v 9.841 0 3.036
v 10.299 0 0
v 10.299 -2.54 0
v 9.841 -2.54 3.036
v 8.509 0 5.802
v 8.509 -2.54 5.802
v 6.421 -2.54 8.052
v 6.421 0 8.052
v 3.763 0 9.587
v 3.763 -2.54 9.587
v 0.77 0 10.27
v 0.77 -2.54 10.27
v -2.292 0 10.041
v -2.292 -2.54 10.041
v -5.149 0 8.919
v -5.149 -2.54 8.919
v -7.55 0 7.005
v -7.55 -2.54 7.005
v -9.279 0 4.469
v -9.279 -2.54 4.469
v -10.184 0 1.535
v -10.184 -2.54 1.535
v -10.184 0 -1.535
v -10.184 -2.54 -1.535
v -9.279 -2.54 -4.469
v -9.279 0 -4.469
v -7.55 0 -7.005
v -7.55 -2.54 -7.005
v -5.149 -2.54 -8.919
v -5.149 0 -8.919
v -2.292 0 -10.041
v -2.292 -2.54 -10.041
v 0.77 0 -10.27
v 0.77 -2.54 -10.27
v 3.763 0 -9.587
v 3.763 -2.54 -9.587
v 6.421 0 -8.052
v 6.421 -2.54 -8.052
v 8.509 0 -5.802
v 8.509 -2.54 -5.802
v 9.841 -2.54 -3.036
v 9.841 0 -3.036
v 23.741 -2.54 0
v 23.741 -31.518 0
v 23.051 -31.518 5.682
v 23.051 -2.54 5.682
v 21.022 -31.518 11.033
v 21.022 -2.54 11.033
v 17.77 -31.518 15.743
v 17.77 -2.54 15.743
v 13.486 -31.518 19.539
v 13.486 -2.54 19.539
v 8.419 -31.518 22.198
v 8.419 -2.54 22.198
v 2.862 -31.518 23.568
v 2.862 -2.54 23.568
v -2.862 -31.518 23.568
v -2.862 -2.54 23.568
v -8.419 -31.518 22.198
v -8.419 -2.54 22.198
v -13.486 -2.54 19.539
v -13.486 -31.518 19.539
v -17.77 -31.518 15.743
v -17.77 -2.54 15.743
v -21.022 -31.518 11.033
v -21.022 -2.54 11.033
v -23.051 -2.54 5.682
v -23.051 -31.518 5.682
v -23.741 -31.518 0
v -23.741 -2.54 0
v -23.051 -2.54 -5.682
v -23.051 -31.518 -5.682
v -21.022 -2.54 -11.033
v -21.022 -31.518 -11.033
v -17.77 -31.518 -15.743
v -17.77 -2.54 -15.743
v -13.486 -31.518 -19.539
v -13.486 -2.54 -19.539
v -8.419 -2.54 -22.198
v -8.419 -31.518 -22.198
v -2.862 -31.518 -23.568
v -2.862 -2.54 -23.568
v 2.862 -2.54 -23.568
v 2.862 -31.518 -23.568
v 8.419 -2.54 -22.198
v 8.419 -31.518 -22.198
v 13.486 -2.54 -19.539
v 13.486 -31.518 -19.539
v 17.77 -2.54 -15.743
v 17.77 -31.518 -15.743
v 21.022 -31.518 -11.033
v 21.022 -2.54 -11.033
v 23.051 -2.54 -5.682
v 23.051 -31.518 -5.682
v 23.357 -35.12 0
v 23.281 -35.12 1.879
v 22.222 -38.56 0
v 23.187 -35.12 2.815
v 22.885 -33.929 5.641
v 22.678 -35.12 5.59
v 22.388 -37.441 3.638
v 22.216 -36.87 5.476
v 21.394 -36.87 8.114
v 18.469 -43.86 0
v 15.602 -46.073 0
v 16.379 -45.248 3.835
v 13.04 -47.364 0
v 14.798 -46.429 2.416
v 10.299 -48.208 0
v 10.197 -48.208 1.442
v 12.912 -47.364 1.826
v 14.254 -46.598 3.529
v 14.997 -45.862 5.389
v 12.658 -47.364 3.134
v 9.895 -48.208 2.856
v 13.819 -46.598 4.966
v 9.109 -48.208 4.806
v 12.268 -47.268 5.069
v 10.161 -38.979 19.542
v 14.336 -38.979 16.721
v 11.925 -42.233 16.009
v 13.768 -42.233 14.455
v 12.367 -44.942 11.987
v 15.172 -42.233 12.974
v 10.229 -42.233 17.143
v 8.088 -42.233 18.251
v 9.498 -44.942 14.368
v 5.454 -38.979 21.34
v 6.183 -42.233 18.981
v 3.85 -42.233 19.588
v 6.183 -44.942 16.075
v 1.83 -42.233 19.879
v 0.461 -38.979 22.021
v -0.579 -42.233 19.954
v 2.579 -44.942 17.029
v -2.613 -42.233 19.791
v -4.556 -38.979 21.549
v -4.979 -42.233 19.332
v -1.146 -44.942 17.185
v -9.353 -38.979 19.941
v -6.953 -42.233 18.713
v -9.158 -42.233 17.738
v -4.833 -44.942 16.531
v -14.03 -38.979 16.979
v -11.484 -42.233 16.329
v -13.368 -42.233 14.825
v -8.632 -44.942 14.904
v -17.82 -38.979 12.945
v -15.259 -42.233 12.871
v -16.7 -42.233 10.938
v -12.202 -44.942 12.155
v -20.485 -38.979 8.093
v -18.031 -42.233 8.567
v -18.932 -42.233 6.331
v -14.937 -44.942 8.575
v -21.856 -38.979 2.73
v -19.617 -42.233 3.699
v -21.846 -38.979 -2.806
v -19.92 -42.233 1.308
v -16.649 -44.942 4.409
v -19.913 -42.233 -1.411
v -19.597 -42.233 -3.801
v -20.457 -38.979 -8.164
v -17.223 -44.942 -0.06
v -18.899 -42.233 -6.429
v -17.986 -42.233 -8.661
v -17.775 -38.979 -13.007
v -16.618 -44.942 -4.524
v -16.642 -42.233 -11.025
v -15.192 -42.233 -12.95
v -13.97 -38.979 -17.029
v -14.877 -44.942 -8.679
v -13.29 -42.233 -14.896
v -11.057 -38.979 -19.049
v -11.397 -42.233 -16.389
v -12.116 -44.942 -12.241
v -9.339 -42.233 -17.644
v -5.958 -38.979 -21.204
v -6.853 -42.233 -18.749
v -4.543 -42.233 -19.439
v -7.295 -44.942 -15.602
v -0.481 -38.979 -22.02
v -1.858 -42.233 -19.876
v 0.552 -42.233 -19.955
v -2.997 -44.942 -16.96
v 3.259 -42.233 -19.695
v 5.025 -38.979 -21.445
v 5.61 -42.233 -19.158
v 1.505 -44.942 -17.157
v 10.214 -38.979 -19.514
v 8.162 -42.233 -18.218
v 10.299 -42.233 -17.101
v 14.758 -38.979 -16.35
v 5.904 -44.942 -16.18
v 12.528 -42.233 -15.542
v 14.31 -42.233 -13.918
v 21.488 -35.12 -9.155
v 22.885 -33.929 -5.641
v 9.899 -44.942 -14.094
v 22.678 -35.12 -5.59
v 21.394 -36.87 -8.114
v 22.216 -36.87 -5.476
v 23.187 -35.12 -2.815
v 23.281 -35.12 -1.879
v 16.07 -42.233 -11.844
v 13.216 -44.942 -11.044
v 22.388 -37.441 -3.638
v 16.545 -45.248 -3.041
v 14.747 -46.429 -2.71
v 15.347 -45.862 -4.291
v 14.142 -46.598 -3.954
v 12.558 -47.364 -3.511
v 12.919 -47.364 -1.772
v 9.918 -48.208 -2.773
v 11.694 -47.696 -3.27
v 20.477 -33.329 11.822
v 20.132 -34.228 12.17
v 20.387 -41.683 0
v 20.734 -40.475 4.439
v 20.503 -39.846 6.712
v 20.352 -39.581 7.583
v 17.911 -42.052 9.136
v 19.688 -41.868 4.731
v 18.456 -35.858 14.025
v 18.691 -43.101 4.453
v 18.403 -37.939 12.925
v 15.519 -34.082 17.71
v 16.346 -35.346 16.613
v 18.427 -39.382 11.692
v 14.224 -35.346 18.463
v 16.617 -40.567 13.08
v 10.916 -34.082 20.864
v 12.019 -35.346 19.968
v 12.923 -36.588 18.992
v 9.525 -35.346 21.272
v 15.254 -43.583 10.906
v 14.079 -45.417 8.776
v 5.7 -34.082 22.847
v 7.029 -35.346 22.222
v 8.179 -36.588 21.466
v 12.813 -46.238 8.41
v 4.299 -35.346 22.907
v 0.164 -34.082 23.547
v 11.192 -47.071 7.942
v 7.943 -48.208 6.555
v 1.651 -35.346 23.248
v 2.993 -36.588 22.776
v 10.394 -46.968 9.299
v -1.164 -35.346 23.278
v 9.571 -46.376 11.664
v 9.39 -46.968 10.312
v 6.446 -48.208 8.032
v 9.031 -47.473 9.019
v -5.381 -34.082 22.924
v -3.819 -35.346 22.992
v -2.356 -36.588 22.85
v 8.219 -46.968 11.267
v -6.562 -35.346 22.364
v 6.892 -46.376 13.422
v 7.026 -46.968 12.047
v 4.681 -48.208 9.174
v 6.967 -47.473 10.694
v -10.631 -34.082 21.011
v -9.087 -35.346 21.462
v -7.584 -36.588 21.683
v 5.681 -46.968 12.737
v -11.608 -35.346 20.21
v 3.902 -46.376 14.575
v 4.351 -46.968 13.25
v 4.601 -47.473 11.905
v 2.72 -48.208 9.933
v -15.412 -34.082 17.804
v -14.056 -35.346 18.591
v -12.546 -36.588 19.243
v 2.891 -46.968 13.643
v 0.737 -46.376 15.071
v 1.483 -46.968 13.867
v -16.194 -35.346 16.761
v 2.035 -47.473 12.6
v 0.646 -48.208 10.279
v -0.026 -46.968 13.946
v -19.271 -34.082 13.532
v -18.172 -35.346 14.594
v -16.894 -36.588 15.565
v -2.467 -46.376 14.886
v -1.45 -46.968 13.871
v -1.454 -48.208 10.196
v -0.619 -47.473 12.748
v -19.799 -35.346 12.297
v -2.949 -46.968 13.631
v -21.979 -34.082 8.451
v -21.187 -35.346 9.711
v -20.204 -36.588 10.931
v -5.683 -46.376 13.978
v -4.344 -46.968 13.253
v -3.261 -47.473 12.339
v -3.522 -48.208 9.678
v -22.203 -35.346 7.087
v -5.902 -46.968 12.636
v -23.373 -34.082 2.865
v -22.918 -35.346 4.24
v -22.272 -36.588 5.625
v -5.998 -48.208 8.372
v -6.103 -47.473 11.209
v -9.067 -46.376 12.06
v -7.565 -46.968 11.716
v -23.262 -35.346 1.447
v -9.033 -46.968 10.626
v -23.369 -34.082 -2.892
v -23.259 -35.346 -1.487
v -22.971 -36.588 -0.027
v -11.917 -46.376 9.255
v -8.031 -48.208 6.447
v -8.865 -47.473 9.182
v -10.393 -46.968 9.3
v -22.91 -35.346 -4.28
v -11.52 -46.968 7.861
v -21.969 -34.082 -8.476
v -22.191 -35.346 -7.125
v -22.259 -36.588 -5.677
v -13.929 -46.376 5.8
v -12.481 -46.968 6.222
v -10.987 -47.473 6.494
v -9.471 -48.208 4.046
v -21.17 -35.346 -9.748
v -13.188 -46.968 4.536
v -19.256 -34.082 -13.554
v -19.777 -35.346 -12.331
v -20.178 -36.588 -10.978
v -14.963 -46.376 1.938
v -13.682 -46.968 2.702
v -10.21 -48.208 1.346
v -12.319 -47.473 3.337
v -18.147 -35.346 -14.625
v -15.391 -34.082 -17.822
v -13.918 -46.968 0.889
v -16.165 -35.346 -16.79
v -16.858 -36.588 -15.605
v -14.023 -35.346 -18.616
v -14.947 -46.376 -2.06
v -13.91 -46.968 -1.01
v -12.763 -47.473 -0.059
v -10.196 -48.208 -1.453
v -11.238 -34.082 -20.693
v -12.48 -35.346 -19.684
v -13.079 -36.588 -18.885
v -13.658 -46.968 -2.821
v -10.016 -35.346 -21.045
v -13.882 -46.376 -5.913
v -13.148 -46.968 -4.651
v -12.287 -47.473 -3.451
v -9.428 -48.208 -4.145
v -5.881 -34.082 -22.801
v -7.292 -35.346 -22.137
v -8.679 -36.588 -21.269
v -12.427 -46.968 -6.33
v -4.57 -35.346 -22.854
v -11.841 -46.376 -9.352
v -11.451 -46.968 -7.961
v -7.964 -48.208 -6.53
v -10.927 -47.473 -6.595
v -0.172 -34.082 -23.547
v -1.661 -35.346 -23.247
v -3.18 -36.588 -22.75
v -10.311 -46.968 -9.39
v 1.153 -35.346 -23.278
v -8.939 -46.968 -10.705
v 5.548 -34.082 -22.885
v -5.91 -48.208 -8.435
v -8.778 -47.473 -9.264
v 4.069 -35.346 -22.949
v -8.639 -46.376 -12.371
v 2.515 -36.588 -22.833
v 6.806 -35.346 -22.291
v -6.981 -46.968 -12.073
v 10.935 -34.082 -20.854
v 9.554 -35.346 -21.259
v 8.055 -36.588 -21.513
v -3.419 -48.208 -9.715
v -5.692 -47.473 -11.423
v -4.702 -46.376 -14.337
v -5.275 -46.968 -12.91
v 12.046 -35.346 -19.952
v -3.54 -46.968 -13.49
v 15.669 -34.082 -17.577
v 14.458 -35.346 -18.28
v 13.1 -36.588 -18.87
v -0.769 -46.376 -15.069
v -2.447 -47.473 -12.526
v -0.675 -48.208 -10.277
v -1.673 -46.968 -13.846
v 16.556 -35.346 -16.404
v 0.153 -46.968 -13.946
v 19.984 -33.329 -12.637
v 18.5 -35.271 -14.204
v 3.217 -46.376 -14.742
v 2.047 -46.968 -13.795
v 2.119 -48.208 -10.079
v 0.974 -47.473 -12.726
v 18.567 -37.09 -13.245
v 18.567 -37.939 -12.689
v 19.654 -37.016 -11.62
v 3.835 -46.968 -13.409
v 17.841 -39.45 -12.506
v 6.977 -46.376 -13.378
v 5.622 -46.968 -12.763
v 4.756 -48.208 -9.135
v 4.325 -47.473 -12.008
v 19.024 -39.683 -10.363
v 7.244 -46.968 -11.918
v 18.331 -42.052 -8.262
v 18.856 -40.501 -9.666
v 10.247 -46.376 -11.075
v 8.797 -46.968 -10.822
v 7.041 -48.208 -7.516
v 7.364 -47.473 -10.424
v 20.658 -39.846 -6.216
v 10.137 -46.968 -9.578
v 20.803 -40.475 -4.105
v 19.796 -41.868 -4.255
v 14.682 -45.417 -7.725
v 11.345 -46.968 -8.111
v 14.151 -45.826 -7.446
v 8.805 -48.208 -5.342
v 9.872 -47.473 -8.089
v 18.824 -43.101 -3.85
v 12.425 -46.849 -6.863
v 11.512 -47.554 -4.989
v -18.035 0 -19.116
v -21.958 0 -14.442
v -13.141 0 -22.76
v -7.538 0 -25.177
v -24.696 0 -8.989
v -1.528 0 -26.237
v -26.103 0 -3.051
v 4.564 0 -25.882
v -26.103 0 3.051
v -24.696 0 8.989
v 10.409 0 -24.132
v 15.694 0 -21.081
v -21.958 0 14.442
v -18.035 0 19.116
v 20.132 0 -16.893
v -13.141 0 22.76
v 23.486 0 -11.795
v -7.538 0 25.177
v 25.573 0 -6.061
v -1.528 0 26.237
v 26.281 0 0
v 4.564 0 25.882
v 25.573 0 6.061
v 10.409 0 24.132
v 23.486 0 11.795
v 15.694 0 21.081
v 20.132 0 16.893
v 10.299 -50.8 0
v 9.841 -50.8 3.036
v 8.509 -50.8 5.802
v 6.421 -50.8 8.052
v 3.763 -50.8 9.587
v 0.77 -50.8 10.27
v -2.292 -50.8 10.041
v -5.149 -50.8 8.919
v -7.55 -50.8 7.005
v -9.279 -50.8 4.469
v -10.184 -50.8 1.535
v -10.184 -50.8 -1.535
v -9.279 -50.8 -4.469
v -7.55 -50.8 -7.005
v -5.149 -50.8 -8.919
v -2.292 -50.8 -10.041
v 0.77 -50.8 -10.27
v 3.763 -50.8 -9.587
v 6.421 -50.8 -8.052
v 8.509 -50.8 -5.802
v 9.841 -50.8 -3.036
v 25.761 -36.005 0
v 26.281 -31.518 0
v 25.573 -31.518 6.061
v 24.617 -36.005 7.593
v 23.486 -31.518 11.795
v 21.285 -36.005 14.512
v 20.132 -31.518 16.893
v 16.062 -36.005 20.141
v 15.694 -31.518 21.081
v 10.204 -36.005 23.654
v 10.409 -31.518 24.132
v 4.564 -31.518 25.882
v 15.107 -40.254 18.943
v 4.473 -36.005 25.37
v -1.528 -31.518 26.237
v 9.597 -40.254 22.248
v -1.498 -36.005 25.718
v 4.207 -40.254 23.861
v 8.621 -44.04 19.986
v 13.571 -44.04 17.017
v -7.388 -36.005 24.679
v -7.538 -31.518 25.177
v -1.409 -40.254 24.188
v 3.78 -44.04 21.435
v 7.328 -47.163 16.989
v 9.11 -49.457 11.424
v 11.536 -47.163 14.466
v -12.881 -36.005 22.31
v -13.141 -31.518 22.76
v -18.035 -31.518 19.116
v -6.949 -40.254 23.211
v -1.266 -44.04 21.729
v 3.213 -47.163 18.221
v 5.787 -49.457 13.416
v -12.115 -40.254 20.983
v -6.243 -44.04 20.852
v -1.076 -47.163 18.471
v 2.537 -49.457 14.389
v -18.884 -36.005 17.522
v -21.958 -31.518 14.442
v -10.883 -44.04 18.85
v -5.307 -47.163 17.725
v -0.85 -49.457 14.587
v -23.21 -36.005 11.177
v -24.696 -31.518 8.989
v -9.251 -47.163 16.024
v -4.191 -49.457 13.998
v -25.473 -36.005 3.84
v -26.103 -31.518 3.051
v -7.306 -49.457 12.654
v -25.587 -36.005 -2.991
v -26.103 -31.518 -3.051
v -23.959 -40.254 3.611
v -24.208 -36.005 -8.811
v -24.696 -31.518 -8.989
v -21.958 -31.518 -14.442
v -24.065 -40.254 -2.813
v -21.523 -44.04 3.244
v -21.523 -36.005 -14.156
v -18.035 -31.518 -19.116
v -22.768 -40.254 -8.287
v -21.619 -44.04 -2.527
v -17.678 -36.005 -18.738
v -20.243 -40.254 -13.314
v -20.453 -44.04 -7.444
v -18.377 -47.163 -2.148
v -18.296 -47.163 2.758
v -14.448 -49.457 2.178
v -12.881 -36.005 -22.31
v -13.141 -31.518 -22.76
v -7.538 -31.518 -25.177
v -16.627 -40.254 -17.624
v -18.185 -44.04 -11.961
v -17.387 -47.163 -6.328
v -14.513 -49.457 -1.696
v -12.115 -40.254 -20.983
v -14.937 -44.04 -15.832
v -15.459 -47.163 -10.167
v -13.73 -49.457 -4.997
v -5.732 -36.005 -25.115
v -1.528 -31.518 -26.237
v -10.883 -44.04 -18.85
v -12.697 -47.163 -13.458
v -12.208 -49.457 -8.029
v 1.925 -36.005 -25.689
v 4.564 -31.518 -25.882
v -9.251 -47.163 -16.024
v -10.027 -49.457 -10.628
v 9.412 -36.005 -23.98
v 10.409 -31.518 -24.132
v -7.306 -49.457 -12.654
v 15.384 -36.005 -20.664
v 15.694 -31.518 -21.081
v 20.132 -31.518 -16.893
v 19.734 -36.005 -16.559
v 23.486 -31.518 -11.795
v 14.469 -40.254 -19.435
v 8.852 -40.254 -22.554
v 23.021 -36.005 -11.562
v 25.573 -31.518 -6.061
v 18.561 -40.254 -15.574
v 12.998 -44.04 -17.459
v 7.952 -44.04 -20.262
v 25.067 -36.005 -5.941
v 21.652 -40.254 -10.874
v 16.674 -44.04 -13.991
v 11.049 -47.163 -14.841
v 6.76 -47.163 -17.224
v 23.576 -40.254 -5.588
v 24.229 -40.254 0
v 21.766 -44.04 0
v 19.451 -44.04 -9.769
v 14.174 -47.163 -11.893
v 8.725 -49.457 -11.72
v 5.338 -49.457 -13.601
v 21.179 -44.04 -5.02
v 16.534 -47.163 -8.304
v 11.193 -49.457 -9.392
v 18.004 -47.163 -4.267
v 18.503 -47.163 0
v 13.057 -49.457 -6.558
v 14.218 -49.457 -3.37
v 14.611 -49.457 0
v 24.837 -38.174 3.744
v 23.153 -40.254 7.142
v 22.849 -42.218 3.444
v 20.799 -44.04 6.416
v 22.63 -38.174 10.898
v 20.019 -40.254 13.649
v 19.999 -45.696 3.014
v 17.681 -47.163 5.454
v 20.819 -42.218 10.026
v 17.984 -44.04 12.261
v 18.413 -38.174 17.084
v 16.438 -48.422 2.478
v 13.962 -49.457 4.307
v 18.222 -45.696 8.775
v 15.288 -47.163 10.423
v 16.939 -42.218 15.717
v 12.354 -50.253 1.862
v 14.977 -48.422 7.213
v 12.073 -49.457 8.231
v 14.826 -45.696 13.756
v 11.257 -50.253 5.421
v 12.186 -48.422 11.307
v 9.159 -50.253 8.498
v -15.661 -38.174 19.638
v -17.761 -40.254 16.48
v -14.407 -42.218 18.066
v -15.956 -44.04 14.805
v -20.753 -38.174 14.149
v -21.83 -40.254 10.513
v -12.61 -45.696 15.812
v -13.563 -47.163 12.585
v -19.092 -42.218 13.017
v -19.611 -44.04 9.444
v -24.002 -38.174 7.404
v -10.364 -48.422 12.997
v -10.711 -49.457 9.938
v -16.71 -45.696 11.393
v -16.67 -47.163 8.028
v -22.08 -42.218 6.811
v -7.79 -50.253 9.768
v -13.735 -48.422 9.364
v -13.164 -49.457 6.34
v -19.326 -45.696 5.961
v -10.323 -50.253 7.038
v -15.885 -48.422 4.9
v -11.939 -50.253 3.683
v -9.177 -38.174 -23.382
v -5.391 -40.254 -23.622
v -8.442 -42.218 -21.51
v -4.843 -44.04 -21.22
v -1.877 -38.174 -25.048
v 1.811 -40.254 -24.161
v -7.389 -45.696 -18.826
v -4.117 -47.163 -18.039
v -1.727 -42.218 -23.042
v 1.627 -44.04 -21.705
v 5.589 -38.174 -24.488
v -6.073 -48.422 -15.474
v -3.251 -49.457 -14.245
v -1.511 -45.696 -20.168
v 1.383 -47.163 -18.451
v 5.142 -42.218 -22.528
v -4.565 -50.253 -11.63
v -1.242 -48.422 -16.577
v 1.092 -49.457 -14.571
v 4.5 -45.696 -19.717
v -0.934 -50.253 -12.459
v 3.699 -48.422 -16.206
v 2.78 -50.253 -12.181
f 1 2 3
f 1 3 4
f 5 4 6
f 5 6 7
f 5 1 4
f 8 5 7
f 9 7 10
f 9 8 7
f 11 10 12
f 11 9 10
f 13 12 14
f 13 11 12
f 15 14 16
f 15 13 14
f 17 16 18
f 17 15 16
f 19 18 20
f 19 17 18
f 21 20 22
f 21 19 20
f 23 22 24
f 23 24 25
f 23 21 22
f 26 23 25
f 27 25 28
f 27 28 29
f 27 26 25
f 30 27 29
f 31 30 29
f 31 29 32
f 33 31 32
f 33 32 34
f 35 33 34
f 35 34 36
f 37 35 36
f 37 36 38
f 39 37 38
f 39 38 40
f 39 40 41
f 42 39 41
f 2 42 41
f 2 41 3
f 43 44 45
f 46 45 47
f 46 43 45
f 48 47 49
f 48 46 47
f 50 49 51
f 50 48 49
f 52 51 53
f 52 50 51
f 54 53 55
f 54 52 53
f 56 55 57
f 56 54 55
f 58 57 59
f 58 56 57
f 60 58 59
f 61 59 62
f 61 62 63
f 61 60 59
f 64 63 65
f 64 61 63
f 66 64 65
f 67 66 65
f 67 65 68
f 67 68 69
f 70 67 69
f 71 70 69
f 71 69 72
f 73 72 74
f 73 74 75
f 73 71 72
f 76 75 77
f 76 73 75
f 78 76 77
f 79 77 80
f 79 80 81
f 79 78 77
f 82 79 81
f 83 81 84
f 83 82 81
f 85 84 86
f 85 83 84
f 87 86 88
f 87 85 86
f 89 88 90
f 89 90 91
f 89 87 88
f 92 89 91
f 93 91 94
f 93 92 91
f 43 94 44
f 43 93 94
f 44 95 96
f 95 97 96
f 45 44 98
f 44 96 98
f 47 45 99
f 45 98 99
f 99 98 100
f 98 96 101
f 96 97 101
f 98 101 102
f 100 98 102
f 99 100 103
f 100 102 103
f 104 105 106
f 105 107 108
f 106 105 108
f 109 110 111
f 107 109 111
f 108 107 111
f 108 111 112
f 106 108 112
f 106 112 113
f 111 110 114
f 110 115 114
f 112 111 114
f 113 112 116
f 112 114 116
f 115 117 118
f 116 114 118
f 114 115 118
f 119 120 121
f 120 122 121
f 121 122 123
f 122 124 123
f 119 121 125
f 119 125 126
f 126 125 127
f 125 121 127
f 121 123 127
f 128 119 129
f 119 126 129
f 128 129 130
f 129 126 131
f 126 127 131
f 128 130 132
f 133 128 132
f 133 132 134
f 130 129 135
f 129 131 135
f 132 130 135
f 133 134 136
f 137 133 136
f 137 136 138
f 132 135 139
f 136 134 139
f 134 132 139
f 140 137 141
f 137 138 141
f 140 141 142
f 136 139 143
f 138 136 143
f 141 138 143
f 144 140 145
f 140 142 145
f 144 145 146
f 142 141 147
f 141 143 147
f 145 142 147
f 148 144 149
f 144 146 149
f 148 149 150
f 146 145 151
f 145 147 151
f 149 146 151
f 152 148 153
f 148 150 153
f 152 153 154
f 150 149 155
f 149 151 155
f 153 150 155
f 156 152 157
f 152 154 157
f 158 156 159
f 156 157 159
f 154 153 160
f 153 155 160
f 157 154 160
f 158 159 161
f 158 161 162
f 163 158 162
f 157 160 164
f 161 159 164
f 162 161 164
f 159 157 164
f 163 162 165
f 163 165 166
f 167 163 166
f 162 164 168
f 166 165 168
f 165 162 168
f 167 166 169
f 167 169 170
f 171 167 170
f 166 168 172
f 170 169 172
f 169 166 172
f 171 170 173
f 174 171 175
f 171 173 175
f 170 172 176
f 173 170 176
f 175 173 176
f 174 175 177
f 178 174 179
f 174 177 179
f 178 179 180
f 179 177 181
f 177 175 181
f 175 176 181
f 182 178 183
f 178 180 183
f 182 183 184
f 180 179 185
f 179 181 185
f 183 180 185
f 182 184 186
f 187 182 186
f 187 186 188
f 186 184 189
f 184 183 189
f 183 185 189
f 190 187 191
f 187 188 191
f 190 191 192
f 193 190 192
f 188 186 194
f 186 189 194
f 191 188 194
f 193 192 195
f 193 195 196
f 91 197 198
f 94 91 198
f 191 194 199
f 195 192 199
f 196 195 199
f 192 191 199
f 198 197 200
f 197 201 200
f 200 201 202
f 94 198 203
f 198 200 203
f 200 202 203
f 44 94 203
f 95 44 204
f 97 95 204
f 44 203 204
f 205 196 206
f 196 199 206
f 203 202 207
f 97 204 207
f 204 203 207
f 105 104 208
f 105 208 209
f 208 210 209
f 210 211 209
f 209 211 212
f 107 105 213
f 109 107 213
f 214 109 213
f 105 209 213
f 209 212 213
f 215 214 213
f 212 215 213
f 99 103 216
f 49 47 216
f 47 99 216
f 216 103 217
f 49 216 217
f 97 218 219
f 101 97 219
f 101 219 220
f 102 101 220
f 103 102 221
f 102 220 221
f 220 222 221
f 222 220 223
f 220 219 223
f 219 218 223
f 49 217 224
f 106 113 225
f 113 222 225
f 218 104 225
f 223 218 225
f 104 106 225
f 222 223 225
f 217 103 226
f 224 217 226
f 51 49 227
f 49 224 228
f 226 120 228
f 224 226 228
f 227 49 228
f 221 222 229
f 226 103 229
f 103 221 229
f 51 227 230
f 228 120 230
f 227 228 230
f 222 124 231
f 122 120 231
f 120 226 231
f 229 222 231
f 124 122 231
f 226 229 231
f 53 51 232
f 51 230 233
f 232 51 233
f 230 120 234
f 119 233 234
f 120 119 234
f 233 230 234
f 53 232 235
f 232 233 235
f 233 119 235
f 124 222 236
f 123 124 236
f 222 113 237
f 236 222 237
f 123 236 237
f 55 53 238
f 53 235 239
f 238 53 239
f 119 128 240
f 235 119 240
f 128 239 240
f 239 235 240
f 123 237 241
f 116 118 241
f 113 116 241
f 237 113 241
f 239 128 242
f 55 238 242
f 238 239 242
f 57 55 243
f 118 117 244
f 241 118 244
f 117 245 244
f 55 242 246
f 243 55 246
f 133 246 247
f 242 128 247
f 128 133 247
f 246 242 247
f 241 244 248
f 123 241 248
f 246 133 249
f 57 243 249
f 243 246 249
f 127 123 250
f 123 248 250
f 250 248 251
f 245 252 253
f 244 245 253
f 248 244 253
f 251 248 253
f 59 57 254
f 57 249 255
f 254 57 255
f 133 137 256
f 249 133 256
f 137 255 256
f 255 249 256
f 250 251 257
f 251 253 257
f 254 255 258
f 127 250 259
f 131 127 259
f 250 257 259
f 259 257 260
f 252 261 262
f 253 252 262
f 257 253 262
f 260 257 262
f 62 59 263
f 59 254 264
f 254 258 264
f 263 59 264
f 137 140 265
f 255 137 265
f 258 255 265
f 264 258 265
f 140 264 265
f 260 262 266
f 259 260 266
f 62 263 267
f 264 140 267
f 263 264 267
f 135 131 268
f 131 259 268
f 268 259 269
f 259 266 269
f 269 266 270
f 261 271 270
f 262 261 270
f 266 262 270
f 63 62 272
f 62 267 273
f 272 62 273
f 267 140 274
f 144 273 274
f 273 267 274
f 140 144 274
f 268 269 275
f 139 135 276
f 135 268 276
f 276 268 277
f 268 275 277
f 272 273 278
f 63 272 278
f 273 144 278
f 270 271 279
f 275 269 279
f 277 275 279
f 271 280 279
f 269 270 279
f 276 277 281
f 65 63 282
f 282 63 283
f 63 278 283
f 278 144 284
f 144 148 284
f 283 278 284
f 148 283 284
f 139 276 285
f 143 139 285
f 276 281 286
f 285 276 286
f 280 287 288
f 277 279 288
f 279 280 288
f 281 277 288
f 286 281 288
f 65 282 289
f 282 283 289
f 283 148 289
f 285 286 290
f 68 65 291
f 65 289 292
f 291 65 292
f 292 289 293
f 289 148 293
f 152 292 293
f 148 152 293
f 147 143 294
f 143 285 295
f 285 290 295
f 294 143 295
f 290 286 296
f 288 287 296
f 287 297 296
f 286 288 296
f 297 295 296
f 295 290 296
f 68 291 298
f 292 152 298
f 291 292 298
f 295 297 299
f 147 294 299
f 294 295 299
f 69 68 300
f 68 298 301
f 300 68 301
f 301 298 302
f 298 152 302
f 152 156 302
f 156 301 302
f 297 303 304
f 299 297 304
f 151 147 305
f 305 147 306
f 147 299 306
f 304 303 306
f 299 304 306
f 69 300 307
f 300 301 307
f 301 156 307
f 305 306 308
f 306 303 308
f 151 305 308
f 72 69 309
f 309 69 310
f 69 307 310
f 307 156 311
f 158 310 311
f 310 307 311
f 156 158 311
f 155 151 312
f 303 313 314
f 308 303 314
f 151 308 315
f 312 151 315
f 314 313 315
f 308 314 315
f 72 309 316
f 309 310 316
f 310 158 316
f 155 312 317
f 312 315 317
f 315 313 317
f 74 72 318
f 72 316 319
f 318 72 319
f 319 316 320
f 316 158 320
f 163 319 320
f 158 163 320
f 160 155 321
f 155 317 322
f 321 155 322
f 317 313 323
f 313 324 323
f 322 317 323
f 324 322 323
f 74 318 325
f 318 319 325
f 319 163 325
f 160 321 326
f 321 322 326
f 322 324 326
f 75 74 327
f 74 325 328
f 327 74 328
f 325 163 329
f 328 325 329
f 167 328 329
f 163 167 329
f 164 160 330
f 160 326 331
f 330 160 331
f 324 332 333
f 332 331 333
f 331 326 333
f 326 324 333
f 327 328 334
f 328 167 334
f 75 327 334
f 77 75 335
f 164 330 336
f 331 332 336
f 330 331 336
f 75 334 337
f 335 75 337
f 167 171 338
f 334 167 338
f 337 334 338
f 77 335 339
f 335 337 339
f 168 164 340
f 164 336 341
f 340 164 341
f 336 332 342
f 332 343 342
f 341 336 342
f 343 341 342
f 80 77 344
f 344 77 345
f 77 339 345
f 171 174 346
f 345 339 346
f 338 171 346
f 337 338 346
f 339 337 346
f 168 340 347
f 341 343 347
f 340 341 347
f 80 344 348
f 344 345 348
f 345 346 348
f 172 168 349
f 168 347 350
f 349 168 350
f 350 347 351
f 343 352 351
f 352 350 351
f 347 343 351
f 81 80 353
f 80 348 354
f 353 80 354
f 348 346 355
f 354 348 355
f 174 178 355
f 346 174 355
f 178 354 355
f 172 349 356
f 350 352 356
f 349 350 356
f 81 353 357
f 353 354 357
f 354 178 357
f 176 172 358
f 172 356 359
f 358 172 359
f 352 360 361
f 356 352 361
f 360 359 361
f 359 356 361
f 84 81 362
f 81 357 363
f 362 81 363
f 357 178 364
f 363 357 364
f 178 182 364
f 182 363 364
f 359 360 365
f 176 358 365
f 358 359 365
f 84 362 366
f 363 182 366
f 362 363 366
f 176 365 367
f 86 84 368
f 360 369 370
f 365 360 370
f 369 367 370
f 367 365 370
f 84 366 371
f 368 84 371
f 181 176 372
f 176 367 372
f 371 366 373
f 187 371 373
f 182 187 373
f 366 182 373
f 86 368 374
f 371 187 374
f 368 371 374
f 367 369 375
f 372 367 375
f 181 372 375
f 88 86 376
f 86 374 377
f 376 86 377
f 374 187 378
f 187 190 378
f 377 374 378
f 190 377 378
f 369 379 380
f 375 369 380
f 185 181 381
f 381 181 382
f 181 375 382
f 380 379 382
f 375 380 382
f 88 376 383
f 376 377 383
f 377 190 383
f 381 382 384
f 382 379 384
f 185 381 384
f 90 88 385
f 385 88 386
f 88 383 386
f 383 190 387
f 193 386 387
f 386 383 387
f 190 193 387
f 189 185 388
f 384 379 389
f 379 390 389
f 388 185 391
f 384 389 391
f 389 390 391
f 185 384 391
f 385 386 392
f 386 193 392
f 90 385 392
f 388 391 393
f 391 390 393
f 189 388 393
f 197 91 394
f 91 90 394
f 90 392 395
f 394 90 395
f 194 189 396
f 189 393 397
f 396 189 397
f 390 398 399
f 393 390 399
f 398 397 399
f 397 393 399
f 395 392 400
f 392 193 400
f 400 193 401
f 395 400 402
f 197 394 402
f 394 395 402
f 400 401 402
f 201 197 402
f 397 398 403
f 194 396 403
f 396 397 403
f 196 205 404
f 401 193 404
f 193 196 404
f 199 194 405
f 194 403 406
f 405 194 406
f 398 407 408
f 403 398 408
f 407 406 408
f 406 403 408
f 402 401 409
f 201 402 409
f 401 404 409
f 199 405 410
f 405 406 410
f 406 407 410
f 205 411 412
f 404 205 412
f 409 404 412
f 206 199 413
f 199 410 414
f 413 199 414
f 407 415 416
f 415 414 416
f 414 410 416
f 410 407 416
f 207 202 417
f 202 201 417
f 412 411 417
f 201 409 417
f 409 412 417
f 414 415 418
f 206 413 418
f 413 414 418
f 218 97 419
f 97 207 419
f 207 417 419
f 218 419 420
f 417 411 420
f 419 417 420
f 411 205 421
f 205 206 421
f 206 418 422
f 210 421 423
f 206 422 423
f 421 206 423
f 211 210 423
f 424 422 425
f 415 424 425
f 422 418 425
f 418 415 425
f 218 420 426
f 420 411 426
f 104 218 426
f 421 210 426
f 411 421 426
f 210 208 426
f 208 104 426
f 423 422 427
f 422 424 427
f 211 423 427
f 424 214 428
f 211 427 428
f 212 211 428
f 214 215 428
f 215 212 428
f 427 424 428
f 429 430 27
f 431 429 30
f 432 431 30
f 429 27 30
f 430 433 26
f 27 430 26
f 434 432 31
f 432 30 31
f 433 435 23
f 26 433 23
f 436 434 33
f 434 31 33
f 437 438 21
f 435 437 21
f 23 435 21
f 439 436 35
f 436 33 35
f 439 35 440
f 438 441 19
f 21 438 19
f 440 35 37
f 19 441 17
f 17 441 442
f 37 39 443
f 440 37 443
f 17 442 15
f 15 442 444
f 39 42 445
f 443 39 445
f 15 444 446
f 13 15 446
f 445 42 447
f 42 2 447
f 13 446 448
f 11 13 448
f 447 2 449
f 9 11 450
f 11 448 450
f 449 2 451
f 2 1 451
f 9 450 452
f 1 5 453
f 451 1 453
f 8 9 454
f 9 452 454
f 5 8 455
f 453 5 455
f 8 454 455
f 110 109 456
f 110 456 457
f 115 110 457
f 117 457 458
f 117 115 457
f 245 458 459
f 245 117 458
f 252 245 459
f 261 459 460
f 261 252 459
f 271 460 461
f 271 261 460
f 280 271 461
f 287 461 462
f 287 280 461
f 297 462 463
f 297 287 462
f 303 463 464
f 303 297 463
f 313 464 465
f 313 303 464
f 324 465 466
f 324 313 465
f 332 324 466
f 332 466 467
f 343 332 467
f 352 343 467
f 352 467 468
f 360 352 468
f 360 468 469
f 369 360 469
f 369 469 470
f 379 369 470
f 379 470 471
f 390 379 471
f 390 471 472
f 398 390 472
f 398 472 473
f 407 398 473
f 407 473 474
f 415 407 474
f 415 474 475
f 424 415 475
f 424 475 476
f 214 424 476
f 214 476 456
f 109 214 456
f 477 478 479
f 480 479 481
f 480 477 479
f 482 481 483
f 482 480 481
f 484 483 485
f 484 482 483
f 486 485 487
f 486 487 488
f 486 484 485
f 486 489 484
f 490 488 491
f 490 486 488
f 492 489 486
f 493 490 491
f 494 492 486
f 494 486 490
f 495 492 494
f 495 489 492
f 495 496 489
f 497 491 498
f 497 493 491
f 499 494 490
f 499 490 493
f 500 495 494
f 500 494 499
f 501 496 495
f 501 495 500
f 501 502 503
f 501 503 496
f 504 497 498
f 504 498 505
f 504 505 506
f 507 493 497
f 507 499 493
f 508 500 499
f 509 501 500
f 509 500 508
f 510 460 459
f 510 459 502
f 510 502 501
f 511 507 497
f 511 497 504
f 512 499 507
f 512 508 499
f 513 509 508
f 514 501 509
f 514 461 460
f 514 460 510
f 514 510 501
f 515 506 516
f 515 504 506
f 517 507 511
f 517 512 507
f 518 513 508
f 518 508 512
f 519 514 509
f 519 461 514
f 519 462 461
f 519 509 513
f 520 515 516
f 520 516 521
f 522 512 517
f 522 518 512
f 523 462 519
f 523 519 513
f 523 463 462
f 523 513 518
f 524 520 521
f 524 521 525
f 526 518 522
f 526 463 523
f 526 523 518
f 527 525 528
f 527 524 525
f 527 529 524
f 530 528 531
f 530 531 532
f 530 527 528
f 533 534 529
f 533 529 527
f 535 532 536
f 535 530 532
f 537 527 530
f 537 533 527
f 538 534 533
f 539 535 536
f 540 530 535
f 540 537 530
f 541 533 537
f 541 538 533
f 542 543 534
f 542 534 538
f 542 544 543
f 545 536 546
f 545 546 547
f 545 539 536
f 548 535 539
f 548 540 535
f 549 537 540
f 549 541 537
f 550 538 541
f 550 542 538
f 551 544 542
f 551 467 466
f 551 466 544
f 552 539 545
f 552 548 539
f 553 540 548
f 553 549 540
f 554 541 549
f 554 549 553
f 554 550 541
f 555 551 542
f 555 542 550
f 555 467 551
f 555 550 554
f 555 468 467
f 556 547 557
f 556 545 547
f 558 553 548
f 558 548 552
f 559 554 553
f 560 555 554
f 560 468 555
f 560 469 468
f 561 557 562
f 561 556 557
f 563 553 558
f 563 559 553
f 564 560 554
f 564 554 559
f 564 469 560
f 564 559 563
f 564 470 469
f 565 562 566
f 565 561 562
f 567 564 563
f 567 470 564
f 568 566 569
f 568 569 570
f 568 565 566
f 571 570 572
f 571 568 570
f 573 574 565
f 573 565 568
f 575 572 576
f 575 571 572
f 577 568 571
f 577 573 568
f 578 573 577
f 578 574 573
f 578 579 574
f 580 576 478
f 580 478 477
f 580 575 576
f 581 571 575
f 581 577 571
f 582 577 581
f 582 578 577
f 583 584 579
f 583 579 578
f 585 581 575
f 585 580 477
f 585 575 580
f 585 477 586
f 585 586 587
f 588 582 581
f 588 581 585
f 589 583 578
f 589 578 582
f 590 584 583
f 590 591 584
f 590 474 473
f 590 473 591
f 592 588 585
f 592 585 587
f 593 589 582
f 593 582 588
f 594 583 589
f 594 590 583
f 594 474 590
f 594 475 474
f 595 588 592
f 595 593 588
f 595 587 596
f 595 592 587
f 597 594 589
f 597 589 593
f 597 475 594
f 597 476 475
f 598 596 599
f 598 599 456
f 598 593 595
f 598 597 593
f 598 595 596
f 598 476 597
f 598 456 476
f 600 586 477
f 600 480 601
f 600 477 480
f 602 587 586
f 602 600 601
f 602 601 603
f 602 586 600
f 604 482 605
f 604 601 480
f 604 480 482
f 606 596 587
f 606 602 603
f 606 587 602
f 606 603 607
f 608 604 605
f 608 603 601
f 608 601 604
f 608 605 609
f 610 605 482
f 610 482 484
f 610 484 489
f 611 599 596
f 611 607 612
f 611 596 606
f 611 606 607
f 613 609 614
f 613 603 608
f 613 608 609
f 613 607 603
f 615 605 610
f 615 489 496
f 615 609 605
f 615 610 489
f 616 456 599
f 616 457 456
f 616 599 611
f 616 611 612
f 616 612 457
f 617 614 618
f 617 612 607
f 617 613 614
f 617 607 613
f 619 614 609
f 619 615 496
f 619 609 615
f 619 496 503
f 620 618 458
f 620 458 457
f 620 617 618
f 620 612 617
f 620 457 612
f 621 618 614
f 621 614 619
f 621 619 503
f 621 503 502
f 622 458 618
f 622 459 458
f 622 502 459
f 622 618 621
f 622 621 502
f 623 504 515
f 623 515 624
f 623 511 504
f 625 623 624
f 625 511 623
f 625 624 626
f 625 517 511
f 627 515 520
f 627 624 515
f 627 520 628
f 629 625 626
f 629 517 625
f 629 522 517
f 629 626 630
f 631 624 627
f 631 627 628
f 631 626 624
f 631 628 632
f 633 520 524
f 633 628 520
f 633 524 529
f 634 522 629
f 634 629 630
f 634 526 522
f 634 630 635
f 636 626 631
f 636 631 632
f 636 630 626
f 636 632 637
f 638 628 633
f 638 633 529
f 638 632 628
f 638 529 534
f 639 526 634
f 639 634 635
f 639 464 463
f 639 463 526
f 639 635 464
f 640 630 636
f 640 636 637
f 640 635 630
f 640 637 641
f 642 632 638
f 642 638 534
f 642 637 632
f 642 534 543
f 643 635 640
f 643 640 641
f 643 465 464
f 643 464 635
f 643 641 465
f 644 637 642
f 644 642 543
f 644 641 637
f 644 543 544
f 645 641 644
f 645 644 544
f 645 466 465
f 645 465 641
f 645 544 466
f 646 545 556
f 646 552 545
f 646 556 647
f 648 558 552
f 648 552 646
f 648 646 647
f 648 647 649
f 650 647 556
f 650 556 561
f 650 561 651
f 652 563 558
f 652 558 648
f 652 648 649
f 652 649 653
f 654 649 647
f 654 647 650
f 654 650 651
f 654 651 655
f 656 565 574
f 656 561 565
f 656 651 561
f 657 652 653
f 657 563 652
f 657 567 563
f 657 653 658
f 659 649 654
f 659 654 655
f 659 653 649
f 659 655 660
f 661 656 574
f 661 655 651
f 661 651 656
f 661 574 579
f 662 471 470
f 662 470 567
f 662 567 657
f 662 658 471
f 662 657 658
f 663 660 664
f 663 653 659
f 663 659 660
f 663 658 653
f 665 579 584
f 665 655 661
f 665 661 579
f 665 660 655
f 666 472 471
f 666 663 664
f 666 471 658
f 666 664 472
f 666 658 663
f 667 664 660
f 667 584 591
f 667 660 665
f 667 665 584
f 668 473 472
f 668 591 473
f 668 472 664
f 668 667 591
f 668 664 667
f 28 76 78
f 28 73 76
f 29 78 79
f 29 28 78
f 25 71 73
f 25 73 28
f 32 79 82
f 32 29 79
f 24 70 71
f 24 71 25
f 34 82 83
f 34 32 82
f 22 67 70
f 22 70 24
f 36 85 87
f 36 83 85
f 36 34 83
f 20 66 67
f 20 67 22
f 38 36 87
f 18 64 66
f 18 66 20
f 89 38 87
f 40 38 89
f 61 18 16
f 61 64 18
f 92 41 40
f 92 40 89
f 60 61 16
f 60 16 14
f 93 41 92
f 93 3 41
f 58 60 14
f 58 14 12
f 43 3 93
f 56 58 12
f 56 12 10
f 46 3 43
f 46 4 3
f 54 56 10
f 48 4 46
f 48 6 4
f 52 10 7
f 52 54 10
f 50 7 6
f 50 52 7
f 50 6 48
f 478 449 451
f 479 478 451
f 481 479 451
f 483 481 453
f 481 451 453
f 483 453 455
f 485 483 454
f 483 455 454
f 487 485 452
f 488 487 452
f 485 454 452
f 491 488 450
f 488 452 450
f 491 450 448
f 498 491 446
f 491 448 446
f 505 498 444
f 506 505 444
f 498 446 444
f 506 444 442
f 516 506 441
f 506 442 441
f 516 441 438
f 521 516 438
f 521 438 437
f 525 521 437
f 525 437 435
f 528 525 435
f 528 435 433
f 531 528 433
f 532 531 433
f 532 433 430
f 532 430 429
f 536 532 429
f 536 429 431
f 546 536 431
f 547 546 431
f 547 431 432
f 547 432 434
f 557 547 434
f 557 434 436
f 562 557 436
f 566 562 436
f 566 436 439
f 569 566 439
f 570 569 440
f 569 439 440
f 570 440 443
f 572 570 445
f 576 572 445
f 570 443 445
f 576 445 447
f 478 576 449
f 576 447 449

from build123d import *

# Parameters (mm, degrees)
F0_R     = 26.2810947886
F0_R_2   = 10.298862613
F1_DEPTH = 50.8
F3_T     = -2.54


# Not quite as in the source:
# - a fillet or chamfer that OpenCascade refuses, or shapes differently, is made with other operations: its cross-section is extruded or revolved along the edge and cut away or added


with BuildPart() as f1:
    # F0 (on Front) → F1 (new body)
    with BuildSketch(Plane.XZ):
        Circle(F0_R)
        Circle(F0_R_2, mode=Mode.SUBTRACT)
    extrude(amount=F1_DEPTH)

    # F2: fillet of radius 19.622727835 on 1 edges, made by hand

    # F2_s1 → F2_t2 (revolve, cut)
    with BuildSketch(Plane.XY):
        with BuildLine():
            ThreePointArc((26.2810947886, -31.5179295967), (21.7661117091, -44.0402095843), (10.298862613, -50.8))
            Line((10.298862613, -50.8), (26.2810947886, -50.8))
            Line((26.2810947886, -50.8), (26.2810947886, -31.5179295967))
        make_face()
    revolve(axis=Axis((0, -50.8, 0), (0, -1, 0)), mode=Mode.SUBTRACT)

    # F3
    f3_openings = [f1.faces().sort_by_distance(p)[0] for p in [
        (-10.298863, -25.4, 0),
    ]]
    offset(amount=F3_T, openings=f3_openings)


solid = f1.part
